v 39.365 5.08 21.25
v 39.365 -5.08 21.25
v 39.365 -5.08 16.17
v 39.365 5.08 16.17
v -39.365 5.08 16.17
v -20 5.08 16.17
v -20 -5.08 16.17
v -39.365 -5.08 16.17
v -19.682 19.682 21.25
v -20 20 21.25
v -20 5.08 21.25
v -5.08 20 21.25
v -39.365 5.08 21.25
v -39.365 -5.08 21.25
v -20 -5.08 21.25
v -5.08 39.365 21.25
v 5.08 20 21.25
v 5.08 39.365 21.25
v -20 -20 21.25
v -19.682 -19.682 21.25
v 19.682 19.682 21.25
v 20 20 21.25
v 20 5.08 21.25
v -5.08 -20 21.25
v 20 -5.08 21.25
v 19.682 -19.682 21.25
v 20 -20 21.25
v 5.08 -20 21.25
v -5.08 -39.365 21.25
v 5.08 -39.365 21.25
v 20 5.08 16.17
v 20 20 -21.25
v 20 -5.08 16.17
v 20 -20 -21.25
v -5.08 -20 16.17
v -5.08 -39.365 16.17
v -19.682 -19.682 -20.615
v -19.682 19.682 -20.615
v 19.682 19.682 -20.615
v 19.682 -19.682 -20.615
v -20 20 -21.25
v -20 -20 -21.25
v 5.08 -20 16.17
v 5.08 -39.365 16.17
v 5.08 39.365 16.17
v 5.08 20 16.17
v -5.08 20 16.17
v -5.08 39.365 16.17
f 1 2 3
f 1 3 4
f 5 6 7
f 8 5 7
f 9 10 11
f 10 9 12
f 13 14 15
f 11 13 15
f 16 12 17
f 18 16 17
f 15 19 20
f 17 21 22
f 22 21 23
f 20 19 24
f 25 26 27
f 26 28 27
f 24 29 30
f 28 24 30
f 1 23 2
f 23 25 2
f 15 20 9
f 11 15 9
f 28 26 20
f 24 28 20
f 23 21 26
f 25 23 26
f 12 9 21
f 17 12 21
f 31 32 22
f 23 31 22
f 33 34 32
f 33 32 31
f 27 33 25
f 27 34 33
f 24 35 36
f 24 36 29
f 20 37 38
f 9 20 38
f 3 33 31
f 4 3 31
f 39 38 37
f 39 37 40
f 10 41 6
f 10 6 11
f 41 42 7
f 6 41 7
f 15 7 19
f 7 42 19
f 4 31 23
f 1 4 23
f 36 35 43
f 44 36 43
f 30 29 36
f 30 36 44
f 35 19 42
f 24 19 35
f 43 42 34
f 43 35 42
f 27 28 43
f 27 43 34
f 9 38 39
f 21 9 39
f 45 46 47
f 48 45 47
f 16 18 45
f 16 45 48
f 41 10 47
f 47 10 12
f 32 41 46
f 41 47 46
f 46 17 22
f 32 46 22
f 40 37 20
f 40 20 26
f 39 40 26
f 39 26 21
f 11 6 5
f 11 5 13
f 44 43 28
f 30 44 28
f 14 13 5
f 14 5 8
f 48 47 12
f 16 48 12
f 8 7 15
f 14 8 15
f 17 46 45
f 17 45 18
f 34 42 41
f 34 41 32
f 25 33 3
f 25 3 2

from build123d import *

# Parameters (mm, degrees)
F0_W      = 40
F0_H      = 42.5
F1_DEPTH  = 20
F2_W      = 39.365
F2_H      = 39.365
F3_DEPTH  = 41.865
F4_W      = 10.16
F4_H      = 5.08
F8_DEPTH  = 19.365
F5_W      = 10.16
F5_H      = 5.08
F9_DEPTH  = 19.365
F6_W      = 10.16
F6_H      = 5.08
F10_DEPTH = 19.365
F7_W      = 10.16
F7_H      = 5.08
F11_DEPTH = 19.365


with BuildPart() as f1:
    # F0 (on Front) → F1 (new body, symmetric)
    with BuildSketch(Plane.XZ):
        Rectangle(F0_W, F0_H)
    extrude(amount=F1_DEPTH, both=True)

    # F2 (on face) → F3 (cut)
    with BuildSketch(Plane.XY.offset(21.25)):
        Rectangle(F2_W, F2_H)
    extrude(amount=-F3_DEPTH, mode=Mode.SUBTRACT)

    # F4 (on face) → F8 (join)
    with BuildSketch(Plane.XZ.offset(20)):
        with Locations((0, 18.71)):
            Rectangle(F4_W, F4_H)
    extrude(amount=F8_DEPTH)

    # F5 (on face) → F9 (join)
    with BuildSketch(Plane(origin=(-20, 0, 0), x_dir=(0, -1, 0), z_dir=(-1, 0, 0))):
        with Locations((0, 18.71)):
            Rectangle(F5_W, F5_H)
    extrude(amount=F9_DEPTH)

    # F6 (on face) → F10 (join)
    with BuildSketch(Plane(origin=(0, 20, 0), x_dir=(-1, 0, 0), z_dir=(0, 1, 0))):
        with Locations((0, 18.71)):
            Rectangle(F6_W, F6_H)
    extrude(amount=F10_DEPTH)

    # F7 (on face) → F11 (join)
    with BuildSketch(Plane.YZ.offset(20)):
        with Locations((0, 18.71)):
            Rectangle(F7_W, F7_H)
    extrude(amount=F11_DEPTH)


solid = f1.part
